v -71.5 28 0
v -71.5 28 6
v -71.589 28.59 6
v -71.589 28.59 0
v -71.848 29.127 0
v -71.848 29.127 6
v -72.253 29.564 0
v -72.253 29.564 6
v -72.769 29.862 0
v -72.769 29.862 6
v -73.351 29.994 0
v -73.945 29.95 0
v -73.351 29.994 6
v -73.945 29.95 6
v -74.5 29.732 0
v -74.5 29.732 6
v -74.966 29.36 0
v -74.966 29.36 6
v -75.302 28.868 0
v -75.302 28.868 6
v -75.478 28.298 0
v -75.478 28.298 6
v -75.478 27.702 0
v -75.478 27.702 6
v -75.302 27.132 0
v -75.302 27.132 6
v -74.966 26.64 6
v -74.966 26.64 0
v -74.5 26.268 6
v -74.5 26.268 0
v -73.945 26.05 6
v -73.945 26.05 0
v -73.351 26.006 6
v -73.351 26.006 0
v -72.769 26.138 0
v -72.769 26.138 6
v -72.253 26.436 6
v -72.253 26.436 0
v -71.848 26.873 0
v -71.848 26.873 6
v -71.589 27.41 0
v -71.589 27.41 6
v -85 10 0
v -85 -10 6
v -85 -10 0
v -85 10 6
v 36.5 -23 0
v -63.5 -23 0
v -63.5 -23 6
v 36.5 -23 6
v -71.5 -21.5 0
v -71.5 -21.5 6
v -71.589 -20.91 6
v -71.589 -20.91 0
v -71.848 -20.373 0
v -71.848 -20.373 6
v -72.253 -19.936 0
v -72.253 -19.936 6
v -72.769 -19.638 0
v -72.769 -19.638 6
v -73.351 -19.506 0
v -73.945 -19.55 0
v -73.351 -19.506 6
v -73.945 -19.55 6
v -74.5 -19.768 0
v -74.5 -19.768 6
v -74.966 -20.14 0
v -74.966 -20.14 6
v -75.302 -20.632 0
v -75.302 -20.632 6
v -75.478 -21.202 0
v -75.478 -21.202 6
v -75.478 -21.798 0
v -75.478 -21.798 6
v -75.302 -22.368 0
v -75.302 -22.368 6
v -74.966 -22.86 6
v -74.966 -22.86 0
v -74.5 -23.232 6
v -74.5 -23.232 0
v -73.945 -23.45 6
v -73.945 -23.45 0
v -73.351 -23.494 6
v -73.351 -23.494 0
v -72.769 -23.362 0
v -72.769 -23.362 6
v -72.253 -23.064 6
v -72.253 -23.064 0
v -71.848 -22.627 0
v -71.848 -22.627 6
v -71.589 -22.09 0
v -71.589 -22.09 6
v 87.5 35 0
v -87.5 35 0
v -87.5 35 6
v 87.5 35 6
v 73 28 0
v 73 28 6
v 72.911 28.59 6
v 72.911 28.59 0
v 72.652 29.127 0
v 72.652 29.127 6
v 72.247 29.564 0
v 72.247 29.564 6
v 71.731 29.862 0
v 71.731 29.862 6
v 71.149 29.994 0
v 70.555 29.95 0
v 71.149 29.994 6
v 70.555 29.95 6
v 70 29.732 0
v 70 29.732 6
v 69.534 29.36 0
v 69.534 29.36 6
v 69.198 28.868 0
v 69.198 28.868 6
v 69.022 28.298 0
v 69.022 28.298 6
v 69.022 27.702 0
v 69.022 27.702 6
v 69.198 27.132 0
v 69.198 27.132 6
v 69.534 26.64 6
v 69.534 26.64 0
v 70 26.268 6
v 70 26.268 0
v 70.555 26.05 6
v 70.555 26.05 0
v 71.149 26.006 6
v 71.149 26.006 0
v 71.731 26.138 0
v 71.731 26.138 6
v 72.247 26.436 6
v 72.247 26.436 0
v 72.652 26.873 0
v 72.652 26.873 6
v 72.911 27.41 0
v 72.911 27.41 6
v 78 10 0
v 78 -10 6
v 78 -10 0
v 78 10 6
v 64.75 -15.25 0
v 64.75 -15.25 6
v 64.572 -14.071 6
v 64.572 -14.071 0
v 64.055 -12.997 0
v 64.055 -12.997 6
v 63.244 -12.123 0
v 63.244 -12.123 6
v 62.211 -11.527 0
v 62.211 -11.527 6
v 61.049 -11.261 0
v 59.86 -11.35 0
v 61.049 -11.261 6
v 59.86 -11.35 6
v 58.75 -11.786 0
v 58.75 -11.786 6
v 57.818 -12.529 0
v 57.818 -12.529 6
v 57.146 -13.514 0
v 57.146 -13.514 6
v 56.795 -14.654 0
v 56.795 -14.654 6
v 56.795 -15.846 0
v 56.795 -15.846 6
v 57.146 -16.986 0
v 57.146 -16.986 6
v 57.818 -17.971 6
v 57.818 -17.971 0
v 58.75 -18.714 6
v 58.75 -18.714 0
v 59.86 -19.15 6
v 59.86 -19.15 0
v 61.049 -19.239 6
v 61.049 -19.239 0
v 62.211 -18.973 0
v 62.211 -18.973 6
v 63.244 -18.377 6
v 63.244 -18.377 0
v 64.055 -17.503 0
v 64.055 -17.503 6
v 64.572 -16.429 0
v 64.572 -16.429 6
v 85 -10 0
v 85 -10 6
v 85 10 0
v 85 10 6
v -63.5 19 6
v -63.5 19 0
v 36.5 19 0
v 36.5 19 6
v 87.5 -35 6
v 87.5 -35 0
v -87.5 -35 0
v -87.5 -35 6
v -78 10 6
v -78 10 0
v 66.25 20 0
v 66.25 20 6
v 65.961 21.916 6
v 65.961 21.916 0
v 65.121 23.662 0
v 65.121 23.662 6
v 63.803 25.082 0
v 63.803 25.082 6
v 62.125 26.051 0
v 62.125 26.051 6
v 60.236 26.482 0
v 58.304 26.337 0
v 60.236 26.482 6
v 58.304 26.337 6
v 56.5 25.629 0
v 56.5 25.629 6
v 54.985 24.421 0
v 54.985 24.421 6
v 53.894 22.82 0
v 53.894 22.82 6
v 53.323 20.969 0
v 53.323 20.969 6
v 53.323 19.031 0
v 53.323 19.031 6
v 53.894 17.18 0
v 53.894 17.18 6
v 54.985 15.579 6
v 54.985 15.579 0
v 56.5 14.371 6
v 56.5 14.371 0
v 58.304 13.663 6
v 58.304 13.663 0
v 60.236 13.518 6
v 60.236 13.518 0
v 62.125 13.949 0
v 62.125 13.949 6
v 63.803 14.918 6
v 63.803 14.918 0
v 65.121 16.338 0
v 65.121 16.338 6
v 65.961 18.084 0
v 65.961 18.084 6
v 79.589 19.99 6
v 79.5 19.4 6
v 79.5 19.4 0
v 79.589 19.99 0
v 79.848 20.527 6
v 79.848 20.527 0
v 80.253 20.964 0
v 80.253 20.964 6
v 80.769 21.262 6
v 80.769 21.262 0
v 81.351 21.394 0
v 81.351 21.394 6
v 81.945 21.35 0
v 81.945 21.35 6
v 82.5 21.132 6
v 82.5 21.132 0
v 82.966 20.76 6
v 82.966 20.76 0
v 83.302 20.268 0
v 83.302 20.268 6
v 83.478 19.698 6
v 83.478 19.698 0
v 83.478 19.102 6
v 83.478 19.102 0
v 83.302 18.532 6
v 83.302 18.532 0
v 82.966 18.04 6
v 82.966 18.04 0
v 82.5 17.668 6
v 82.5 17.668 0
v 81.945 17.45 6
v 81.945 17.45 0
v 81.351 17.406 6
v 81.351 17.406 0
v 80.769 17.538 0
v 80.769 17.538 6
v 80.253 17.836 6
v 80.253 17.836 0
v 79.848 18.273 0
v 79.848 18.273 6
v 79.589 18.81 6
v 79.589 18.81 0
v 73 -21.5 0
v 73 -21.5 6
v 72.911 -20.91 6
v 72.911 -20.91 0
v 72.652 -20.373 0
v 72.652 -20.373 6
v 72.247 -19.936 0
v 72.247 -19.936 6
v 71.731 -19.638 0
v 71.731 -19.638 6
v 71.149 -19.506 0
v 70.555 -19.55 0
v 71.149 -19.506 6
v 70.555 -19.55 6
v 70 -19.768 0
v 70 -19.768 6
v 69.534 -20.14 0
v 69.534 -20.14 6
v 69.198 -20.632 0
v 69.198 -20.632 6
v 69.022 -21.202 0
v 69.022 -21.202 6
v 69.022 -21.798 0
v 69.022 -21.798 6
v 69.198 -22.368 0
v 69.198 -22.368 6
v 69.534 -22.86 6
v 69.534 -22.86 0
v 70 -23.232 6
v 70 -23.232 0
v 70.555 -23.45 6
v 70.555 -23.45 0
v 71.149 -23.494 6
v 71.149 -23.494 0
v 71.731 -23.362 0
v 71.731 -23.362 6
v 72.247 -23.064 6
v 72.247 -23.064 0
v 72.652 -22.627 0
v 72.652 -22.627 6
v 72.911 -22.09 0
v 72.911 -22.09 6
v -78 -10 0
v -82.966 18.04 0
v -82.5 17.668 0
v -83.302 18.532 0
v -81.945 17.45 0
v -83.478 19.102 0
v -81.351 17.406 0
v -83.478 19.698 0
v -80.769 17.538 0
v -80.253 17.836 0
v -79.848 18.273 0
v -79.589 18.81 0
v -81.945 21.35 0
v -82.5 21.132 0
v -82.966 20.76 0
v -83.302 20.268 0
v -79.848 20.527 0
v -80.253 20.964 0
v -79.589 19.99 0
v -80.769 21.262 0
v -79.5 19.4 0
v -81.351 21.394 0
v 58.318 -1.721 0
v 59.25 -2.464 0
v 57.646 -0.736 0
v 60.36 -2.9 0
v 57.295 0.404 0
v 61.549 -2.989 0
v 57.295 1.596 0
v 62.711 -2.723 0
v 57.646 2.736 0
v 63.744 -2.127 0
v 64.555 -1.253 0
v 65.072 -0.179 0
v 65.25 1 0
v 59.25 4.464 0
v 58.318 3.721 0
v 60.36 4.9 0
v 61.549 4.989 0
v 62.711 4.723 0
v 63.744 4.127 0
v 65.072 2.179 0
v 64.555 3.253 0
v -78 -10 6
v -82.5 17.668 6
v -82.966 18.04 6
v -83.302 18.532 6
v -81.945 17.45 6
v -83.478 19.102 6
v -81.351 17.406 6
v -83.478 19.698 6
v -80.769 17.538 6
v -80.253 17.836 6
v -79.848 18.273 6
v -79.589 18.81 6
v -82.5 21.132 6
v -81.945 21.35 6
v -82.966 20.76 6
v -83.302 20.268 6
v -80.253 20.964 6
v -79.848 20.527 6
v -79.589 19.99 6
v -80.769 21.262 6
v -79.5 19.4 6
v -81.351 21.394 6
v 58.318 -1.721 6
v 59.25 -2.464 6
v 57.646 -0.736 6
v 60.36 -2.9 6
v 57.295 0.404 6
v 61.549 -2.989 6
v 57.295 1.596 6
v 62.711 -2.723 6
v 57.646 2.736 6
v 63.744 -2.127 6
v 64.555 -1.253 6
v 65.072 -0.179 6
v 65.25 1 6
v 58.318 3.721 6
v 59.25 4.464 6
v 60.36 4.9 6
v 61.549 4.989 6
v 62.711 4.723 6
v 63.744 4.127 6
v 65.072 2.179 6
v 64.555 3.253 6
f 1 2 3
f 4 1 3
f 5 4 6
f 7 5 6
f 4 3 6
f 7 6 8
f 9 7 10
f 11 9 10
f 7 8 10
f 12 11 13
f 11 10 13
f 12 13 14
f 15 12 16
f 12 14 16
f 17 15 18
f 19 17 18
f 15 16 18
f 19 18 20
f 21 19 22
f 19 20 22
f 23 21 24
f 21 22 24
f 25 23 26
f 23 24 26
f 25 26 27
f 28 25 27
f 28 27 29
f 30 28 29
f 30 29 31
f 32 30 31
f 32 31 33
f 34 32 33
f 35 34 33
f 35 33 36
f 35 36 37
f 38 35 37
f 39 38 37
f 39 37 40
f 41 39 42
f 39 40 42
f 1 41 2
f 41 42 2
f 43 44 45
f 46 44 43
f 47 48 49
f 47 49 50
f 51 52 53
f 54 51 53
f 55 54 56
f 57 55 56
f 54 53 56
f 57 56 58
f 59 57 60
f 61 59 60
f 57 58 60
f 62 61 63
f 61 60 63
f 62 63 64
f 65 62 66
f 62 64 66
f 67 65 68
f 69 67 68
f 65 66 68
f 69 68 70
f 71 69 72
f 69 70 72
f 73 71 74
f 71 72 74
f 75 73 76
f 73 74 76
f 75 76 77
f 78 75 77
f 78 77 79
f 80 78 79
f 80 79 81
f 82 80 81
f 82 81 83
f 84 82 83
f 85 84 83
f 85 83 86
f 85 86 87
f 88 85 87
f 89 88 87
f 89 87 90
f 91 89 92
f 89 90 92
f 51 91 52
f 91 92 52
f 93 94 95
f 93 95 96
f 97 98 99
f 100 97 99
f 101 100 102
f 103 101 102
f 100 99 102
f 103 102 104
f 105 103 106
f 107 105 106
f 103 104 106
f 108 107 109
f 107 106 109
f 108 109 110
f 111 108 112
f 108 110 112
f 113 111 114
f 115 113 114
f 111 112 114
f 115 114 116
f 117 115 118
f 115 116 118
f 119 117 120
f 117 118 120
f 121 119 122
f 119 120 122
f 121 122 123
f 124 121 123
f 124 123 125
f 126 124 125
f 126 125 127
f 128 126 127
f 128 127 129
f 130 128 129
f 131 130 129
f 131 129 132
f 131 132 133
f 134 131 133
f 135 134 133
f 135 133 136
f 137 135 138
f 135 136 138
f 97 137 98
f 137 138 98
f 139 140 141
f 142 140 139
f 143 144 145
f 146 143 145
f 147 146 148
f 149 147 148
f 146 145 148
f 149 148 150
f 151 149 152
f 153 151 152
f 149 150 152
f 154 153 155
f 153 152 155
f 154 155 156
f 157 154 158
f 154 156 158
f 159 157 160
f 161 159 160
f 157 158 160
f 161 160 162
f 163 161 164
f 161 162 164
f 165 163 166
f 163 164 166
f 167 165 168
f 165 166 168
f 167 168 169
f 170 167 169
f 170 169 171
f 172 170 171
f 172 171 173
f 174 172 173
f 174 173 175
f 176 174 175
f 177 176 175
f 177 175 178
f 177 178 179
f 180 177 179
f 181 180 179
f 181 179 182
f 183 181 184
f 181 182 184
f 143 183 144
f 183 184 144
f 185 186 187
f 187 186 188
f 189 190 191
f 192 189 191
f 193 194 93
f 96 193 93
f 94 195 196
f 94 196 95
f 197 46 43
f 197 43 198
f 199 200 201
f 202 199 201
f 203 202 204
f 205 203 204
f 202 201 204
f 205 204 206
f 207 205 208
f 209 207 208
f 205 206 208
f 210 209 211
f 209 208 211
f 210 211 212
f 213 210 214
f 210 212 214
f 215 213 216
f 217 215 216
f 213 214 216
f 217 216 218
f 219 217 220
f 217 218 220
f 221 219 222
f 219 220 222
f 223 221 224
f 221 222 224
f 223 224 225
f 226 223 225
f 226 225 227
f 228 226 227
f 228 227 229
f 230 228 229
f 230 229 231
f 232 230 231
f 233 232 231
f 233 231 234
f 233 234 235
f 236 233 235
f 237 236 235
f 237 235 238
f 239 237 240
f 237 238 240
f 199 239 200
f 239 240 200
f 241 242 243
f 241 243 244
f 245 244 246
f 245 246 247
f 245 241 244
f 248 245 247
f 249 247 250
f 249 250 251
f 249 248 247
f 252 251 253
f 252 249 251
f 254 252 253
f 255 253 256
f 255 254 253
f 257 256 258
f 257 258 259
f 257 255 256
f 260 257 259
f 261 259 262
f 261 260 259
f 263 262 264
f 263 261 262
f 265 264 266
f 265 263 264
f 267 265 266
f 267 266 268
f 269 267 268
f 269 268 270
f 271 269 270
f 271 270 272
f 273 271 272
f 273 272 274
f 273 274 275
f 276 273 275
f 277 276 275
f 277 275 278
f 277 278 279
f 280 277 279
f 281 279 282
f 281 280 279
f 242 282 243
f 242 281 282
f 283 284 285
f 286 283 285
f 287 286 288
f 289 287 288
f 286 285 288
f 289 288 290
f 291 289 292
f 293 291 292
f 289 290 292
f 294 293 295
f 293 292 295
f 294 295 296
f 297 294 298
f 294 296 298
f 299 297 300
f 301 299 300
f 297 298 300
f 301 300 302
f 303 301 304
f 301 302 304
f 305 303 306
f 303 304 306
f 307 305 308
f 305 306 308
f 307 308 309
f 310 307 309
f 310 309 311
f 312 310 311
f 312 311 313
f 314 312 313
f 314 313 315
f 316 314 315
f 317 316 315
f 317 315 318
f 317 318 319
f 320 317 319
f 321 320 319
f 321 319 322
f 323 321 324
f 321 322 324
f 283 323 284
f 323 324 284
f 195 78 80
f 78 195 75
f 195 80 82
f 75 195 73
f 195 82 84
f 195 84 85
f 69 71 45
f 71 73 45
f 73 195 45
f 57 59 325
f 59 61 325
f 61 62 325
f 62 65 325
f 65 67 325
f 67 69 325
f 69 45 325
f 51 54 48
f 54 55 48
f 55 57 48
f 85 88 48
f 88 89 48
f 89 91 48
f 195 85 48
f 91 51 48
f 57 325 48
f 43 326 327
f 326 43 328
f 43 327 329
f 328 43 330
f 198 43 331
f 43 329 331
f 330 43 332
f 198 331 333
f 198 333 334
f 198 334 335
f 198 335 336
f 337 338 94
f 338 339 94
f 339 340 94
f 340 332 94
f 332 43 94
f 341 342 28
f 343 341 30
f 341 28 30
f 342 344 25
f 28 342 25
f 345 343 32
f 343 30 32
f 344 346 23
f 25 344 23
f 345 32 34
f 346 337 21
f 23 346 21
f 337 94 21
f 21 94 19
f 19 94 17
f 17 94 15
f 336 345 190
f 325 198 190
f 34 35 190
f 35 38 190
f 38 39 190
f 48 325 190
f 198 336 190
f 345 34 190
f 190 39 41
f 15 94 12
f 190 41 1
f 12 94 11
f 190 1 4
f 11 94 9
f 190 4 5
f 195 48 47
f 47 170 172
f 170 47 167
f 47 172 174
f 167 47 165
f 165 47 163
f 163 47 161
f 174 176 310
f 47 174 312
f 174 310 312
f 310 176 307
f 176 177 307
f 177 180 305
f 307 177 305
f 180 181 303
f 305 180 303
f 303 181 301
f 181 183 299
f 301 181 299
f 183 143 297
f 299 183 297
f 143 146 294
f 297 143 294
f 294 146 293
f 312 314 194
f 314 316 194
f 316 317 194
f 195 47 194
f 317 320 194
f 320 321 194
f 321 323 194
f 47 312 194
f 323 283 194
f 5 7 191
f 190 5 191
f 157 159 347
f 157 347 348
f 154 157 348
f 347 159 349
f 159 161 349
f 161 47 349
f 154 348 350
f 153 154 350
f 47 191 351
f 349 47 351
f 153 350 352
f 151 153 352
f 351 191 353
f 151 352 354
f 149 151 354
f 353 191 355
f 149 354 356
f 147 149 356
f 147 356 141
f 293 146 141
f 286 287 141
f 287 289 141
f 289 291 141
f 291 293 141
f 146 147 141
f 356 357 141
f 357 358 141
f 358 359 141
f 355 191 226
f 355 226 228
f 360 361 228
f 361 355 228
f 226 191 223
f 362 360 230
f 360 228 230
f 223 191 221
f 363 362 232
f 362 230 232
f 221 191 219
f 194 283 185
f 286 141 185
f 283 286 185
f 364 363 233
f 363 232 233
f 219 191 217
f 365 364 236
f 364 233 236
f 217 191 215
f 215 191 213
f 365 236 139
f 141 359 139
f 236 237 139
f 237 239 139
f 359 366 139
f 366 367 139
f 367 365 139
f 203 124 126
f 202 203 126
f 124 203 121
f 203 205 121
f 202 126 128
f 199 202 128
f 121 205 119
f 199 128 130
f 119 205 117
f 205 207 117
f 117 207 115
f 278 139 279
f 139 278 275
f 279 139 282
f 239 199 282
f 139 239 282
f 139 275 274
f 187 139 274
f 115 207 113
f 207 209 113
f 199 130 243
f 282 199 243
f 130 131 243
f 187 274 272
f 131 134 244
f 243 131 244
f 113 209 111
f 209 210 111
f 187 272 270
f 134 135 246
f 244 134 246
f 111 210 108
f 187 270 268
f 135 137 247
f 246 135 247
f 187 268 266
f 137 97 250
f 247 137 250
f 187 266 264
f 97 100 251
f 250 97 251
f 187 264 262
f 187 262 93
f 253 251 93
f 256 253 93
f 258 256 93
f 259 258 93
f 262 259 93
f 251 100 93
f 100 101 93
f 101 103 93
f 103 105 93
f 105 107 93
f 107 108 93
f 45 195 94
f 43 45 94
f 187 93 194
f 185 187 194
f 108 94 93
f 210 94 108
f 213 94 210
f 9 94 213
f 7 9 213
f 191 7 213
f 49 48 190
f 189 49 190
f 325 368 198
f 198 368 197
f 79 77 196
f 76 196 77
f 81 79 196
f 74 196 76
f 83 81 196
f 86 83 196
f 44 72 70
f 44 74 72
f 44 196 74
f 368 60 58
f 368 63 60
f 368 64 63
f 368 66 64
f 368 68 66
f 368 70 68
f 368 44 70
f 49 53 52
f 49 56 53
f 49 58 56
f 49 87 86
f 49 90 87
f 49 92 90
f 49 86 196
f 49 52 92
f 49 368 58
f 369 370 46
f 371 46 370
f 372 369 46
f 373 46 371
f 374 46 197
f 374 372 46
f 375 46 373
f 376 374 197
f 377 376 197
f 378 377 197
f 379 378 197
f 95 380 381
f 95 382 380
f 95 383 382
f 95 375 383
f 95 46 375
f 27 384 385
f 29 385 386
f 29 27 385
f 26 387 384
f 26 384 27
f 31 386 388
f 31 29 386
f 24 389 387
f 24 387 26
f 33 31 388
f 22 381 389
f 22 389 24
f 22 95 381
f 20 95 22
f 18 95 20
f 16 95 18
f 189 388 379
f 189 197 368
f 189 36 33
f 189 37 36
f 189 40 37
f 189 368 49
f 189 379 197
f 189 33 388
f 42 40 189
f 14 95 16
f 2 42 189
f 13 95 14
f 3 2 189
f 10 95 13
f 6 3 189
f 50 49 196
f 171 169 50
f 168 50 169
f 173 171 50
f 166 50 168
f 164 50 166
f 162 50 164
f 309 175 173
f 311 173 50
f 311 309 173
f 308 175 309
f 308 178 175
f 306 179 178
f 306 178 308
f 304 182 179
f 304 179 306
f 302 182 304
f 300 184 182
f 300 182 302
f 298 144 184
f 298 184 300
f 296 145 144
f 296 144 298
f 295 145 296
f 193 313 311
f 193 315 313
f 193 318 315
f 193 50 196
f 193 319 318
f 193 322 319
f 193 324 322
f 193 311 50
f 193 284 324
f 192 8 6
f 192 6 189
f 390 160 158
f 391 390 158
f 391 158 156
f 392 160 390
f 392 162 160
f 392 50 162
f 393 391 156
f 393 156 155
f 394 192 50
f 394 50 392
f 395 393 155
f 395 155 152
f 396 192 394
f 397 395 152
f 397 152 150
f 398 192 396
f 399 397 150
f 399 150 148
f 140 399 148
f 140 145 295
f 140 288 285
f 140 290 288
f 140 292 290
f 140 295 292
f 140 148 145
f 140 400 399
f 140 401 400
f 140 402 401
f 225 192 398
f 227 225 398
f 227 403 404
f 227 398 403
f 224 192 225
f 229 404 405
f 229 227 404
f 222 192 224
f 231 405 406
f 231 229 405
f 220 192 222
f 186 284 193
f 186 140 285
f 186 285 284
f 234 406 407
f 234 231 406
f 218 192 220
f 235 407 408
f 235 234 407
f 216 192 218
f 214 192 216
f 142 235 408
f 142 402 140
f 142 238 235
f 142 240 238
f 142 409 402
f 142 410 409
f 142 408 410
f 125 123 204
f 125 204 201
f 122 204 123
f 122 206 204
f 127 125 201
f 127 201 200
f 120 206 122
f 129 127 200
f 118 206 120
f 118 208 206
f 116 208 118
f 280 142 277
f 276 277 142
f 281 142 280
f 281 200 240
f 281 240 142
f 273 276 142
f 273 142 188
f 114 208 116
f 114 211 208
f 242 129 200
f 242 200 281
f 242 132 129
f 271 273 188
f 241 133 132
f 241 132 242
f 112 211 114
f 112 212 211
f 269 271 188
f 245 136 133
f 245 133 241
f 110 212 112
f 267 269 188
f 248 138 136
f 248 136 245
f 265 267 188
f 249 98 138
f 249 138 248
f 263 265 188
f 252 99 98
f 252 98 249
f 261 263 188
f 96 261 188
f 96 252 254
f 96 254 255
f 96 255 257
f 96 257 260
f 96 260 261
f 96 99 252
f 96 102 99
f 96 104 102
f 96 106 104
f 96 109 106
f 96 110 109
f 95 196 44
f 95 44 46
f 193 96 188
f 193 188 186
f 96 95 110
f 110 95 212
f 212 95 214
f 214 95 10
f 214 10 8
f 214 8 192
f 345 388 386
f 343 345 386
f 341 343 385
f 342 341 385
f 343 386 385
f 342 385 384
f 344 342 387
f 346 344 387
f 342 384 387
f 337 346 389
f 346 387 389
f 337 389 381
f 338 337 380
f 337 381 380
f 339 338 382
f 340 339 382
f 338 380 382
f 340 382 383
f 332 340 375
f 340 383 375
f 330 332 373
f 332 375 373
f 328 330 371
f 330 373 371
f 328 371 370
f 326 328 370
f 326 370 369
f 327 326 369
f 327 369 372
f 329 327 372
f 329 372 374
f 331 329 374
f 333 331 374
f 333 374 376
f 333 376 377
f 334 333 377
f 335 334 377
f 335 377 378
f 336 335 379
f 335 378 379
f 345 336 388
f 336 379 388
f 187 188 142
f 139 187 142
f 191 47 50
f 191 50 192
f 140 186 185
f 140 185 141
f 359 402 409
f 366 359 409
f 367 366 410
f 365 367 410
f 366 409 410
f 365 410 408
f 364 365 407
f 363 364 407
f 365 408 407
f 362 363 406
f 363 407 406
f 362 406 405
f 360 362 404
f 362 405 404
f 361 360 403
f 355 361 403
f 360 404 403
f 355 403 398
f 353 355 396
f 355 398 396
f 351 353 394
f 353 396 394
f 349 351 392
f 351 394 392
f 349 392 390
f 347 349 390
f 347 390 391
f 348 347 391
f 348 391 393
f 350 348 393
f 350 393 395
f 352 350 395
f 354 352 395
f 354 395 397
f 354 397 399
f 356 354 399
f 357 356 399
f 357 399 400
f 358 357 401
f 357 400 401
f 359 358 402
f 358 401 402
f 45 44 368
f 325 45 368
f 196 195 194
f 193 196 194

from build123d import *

# Parameters (mm, degrees)
ESQUISSE1_W             = 175
ESQUISSE1_H             = 70
ESQUISSE1_W_2           = 100
ESQUISSE1_H_2           = 42
BOSS_EXTRU_1_DEPTH      = 6
ESQUISSE2_R             = 2
ESQUISSE2_W             = 7
ESQUISSE2_H             = 20
ENL_V_MAT_EXTRU_1_DEPTH = 6
ESQUISSE3_R             = 2
ESQUISSE3_R_2           = 6.5
ESQUISSE3_R_3           = 4
ENL_V_MAT_EXTRU_2_DEPTH = 6


with BuildPart() as part:
    # Esquisse1 → Boss.-Extru.1 (new body)
    with BuildSketch(Plane.XY):
        Rectangle(ESQUISSE1_W, ESQUISSE1_H)
        with Locations((-13.5, -2)):
            Rectangle(ESQUISSE1_W_2, ESQUISSE1_H_2, mode=Mode.SUBTRACT)
    extrude(amount=BOSS_EXTRU_1_DEPTH)

    # Esquisse2 → Enlèv. mat.-Extru.1 (cut)
    with BuildSketch(Plane.XY.offset(6)):
        with Locations((-81.5, 19.4)):
            Circle(ESQUISSE2_R)
        with Locations((-81.5, 0)):
            Rectangle(ESQUISSE2_W, ESQUISSE2_H)
    enl_v_mat_extru_1 = extrude(amount=-ENL_V_MAT_EXTRU_1_DEPTH, mode=Mode.SUBTRACT)

    # Symétrie1: Enlèv. mat.-Extru.1 across plane
    add(enl_v_mat_extru_1.mirror(Plane(origin=(0, 0, 0), x_dir=(0, 0, 1), z_dir=(1, 0, 0))), mode=Mode.SUBTRACT)

    # Esquisse3 → Enlèv. mat.-Extru.2 (cut)
    with BuildSketch(Plane.XY.offset(6)):
        with Locations((-73.5, 28)):
            Circle(ESQUISSE3_R)
        with Locations((71, 28)):
            Circle(ESQUISSE3_R)
        with Locations((71, -21.5)):
            Circle(ESQUISSE3_R)
        with Locations((-73.5, -21.5)):
            Circle(ESQUISSE3_R)
        with Locations((59.75, 20)):
            Circle(ESQUISSE3_R_2)
        with Locations((61.25, 1)):
            Circle(ESQUISSE3_R_3)
        with Locations((60.75, -15.25)):
            Circle(ESQUISSE3_R_3)
    extrude(amount=-ENL_V_MAT_EXTRU_2_DEPTH, mode=Mode.SUBTRACT)


solid = part.part
